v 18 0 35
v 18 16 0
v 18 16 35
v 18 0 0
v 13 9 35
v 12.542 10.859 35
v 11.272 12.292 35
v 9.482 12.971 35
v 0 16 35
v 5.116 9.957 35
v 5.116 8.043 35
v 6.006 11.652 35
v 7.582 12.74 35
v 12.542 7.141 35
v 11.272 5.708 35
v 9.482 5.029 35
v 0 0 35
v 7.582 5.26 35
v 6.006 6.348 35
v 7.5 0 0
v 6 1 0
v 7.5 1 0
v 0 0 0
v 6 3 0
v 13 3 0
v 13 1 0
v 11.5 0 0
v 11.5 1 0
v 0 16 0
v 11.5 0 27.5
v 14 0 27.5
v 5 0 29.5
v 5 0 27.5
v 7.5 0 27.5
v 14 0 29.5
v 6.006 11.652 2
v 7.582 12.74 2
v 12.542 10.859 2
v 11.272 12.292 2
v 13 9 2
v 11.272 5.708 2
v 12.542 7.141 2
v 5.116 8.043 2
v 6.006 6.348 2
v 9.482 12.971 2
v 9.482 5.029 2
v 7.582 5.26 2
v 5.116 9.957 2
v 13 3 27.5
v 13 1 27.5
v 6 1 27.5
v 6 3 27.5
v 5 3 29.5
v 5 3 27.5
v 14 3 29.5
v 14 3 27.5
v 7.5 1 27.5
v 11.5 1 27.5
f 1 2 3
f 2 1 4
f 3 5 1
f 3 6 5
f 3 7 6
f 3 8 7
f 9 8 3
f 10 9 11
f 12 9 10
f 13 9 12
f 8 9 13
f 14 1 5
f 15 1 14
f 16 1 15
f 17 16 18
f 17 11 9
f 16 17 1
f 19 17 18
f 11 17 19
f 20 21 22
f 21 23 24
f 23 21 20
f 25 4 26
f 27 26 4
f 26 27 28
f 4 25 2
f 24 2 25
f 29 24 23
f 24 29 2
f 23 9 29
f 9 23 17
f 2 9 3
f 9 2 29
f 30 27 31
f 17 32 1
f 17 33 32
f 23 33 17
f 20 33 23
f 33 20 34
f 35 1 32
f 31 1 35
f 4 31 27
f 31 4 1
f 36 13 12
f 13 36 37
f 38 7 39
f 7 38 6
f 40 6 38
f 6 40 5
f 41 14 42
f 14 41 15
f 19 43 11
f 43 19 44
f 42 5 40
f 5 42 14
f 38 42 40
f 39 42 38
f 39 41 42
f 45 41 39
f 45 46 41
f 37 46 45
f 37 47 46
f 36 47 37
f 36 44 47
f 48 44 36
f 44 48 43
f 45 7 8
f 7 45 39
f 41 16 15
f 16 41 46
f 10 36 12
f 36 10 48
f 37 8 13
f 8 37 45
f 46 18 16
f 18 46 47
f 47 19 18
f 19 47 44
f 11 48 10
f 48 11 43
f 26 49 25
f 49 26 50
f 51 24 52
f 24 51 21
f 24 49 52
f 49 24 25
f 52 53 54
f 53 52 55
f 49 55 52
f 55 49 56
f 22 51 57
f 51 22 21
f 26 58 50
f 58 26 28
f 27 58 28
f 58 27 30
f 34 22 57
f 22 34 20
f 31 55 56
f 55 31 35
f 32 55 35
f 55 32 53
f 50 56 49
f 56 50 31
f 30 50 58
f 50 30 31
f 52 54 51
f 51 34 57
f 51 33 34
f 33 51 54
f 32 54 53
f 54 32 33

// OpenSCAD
difference()
{
	cube([18,16,35]);
	translate([9,9,2]) cylinder(h=35,d=8);
	translate([6,1,-1]) cube([7,2,29.5]);
	translate([7.5,-1,-1]) cube([4,3,29.5]);
	translate([5,-1,27.5]) cube([9,4,2]);
}
